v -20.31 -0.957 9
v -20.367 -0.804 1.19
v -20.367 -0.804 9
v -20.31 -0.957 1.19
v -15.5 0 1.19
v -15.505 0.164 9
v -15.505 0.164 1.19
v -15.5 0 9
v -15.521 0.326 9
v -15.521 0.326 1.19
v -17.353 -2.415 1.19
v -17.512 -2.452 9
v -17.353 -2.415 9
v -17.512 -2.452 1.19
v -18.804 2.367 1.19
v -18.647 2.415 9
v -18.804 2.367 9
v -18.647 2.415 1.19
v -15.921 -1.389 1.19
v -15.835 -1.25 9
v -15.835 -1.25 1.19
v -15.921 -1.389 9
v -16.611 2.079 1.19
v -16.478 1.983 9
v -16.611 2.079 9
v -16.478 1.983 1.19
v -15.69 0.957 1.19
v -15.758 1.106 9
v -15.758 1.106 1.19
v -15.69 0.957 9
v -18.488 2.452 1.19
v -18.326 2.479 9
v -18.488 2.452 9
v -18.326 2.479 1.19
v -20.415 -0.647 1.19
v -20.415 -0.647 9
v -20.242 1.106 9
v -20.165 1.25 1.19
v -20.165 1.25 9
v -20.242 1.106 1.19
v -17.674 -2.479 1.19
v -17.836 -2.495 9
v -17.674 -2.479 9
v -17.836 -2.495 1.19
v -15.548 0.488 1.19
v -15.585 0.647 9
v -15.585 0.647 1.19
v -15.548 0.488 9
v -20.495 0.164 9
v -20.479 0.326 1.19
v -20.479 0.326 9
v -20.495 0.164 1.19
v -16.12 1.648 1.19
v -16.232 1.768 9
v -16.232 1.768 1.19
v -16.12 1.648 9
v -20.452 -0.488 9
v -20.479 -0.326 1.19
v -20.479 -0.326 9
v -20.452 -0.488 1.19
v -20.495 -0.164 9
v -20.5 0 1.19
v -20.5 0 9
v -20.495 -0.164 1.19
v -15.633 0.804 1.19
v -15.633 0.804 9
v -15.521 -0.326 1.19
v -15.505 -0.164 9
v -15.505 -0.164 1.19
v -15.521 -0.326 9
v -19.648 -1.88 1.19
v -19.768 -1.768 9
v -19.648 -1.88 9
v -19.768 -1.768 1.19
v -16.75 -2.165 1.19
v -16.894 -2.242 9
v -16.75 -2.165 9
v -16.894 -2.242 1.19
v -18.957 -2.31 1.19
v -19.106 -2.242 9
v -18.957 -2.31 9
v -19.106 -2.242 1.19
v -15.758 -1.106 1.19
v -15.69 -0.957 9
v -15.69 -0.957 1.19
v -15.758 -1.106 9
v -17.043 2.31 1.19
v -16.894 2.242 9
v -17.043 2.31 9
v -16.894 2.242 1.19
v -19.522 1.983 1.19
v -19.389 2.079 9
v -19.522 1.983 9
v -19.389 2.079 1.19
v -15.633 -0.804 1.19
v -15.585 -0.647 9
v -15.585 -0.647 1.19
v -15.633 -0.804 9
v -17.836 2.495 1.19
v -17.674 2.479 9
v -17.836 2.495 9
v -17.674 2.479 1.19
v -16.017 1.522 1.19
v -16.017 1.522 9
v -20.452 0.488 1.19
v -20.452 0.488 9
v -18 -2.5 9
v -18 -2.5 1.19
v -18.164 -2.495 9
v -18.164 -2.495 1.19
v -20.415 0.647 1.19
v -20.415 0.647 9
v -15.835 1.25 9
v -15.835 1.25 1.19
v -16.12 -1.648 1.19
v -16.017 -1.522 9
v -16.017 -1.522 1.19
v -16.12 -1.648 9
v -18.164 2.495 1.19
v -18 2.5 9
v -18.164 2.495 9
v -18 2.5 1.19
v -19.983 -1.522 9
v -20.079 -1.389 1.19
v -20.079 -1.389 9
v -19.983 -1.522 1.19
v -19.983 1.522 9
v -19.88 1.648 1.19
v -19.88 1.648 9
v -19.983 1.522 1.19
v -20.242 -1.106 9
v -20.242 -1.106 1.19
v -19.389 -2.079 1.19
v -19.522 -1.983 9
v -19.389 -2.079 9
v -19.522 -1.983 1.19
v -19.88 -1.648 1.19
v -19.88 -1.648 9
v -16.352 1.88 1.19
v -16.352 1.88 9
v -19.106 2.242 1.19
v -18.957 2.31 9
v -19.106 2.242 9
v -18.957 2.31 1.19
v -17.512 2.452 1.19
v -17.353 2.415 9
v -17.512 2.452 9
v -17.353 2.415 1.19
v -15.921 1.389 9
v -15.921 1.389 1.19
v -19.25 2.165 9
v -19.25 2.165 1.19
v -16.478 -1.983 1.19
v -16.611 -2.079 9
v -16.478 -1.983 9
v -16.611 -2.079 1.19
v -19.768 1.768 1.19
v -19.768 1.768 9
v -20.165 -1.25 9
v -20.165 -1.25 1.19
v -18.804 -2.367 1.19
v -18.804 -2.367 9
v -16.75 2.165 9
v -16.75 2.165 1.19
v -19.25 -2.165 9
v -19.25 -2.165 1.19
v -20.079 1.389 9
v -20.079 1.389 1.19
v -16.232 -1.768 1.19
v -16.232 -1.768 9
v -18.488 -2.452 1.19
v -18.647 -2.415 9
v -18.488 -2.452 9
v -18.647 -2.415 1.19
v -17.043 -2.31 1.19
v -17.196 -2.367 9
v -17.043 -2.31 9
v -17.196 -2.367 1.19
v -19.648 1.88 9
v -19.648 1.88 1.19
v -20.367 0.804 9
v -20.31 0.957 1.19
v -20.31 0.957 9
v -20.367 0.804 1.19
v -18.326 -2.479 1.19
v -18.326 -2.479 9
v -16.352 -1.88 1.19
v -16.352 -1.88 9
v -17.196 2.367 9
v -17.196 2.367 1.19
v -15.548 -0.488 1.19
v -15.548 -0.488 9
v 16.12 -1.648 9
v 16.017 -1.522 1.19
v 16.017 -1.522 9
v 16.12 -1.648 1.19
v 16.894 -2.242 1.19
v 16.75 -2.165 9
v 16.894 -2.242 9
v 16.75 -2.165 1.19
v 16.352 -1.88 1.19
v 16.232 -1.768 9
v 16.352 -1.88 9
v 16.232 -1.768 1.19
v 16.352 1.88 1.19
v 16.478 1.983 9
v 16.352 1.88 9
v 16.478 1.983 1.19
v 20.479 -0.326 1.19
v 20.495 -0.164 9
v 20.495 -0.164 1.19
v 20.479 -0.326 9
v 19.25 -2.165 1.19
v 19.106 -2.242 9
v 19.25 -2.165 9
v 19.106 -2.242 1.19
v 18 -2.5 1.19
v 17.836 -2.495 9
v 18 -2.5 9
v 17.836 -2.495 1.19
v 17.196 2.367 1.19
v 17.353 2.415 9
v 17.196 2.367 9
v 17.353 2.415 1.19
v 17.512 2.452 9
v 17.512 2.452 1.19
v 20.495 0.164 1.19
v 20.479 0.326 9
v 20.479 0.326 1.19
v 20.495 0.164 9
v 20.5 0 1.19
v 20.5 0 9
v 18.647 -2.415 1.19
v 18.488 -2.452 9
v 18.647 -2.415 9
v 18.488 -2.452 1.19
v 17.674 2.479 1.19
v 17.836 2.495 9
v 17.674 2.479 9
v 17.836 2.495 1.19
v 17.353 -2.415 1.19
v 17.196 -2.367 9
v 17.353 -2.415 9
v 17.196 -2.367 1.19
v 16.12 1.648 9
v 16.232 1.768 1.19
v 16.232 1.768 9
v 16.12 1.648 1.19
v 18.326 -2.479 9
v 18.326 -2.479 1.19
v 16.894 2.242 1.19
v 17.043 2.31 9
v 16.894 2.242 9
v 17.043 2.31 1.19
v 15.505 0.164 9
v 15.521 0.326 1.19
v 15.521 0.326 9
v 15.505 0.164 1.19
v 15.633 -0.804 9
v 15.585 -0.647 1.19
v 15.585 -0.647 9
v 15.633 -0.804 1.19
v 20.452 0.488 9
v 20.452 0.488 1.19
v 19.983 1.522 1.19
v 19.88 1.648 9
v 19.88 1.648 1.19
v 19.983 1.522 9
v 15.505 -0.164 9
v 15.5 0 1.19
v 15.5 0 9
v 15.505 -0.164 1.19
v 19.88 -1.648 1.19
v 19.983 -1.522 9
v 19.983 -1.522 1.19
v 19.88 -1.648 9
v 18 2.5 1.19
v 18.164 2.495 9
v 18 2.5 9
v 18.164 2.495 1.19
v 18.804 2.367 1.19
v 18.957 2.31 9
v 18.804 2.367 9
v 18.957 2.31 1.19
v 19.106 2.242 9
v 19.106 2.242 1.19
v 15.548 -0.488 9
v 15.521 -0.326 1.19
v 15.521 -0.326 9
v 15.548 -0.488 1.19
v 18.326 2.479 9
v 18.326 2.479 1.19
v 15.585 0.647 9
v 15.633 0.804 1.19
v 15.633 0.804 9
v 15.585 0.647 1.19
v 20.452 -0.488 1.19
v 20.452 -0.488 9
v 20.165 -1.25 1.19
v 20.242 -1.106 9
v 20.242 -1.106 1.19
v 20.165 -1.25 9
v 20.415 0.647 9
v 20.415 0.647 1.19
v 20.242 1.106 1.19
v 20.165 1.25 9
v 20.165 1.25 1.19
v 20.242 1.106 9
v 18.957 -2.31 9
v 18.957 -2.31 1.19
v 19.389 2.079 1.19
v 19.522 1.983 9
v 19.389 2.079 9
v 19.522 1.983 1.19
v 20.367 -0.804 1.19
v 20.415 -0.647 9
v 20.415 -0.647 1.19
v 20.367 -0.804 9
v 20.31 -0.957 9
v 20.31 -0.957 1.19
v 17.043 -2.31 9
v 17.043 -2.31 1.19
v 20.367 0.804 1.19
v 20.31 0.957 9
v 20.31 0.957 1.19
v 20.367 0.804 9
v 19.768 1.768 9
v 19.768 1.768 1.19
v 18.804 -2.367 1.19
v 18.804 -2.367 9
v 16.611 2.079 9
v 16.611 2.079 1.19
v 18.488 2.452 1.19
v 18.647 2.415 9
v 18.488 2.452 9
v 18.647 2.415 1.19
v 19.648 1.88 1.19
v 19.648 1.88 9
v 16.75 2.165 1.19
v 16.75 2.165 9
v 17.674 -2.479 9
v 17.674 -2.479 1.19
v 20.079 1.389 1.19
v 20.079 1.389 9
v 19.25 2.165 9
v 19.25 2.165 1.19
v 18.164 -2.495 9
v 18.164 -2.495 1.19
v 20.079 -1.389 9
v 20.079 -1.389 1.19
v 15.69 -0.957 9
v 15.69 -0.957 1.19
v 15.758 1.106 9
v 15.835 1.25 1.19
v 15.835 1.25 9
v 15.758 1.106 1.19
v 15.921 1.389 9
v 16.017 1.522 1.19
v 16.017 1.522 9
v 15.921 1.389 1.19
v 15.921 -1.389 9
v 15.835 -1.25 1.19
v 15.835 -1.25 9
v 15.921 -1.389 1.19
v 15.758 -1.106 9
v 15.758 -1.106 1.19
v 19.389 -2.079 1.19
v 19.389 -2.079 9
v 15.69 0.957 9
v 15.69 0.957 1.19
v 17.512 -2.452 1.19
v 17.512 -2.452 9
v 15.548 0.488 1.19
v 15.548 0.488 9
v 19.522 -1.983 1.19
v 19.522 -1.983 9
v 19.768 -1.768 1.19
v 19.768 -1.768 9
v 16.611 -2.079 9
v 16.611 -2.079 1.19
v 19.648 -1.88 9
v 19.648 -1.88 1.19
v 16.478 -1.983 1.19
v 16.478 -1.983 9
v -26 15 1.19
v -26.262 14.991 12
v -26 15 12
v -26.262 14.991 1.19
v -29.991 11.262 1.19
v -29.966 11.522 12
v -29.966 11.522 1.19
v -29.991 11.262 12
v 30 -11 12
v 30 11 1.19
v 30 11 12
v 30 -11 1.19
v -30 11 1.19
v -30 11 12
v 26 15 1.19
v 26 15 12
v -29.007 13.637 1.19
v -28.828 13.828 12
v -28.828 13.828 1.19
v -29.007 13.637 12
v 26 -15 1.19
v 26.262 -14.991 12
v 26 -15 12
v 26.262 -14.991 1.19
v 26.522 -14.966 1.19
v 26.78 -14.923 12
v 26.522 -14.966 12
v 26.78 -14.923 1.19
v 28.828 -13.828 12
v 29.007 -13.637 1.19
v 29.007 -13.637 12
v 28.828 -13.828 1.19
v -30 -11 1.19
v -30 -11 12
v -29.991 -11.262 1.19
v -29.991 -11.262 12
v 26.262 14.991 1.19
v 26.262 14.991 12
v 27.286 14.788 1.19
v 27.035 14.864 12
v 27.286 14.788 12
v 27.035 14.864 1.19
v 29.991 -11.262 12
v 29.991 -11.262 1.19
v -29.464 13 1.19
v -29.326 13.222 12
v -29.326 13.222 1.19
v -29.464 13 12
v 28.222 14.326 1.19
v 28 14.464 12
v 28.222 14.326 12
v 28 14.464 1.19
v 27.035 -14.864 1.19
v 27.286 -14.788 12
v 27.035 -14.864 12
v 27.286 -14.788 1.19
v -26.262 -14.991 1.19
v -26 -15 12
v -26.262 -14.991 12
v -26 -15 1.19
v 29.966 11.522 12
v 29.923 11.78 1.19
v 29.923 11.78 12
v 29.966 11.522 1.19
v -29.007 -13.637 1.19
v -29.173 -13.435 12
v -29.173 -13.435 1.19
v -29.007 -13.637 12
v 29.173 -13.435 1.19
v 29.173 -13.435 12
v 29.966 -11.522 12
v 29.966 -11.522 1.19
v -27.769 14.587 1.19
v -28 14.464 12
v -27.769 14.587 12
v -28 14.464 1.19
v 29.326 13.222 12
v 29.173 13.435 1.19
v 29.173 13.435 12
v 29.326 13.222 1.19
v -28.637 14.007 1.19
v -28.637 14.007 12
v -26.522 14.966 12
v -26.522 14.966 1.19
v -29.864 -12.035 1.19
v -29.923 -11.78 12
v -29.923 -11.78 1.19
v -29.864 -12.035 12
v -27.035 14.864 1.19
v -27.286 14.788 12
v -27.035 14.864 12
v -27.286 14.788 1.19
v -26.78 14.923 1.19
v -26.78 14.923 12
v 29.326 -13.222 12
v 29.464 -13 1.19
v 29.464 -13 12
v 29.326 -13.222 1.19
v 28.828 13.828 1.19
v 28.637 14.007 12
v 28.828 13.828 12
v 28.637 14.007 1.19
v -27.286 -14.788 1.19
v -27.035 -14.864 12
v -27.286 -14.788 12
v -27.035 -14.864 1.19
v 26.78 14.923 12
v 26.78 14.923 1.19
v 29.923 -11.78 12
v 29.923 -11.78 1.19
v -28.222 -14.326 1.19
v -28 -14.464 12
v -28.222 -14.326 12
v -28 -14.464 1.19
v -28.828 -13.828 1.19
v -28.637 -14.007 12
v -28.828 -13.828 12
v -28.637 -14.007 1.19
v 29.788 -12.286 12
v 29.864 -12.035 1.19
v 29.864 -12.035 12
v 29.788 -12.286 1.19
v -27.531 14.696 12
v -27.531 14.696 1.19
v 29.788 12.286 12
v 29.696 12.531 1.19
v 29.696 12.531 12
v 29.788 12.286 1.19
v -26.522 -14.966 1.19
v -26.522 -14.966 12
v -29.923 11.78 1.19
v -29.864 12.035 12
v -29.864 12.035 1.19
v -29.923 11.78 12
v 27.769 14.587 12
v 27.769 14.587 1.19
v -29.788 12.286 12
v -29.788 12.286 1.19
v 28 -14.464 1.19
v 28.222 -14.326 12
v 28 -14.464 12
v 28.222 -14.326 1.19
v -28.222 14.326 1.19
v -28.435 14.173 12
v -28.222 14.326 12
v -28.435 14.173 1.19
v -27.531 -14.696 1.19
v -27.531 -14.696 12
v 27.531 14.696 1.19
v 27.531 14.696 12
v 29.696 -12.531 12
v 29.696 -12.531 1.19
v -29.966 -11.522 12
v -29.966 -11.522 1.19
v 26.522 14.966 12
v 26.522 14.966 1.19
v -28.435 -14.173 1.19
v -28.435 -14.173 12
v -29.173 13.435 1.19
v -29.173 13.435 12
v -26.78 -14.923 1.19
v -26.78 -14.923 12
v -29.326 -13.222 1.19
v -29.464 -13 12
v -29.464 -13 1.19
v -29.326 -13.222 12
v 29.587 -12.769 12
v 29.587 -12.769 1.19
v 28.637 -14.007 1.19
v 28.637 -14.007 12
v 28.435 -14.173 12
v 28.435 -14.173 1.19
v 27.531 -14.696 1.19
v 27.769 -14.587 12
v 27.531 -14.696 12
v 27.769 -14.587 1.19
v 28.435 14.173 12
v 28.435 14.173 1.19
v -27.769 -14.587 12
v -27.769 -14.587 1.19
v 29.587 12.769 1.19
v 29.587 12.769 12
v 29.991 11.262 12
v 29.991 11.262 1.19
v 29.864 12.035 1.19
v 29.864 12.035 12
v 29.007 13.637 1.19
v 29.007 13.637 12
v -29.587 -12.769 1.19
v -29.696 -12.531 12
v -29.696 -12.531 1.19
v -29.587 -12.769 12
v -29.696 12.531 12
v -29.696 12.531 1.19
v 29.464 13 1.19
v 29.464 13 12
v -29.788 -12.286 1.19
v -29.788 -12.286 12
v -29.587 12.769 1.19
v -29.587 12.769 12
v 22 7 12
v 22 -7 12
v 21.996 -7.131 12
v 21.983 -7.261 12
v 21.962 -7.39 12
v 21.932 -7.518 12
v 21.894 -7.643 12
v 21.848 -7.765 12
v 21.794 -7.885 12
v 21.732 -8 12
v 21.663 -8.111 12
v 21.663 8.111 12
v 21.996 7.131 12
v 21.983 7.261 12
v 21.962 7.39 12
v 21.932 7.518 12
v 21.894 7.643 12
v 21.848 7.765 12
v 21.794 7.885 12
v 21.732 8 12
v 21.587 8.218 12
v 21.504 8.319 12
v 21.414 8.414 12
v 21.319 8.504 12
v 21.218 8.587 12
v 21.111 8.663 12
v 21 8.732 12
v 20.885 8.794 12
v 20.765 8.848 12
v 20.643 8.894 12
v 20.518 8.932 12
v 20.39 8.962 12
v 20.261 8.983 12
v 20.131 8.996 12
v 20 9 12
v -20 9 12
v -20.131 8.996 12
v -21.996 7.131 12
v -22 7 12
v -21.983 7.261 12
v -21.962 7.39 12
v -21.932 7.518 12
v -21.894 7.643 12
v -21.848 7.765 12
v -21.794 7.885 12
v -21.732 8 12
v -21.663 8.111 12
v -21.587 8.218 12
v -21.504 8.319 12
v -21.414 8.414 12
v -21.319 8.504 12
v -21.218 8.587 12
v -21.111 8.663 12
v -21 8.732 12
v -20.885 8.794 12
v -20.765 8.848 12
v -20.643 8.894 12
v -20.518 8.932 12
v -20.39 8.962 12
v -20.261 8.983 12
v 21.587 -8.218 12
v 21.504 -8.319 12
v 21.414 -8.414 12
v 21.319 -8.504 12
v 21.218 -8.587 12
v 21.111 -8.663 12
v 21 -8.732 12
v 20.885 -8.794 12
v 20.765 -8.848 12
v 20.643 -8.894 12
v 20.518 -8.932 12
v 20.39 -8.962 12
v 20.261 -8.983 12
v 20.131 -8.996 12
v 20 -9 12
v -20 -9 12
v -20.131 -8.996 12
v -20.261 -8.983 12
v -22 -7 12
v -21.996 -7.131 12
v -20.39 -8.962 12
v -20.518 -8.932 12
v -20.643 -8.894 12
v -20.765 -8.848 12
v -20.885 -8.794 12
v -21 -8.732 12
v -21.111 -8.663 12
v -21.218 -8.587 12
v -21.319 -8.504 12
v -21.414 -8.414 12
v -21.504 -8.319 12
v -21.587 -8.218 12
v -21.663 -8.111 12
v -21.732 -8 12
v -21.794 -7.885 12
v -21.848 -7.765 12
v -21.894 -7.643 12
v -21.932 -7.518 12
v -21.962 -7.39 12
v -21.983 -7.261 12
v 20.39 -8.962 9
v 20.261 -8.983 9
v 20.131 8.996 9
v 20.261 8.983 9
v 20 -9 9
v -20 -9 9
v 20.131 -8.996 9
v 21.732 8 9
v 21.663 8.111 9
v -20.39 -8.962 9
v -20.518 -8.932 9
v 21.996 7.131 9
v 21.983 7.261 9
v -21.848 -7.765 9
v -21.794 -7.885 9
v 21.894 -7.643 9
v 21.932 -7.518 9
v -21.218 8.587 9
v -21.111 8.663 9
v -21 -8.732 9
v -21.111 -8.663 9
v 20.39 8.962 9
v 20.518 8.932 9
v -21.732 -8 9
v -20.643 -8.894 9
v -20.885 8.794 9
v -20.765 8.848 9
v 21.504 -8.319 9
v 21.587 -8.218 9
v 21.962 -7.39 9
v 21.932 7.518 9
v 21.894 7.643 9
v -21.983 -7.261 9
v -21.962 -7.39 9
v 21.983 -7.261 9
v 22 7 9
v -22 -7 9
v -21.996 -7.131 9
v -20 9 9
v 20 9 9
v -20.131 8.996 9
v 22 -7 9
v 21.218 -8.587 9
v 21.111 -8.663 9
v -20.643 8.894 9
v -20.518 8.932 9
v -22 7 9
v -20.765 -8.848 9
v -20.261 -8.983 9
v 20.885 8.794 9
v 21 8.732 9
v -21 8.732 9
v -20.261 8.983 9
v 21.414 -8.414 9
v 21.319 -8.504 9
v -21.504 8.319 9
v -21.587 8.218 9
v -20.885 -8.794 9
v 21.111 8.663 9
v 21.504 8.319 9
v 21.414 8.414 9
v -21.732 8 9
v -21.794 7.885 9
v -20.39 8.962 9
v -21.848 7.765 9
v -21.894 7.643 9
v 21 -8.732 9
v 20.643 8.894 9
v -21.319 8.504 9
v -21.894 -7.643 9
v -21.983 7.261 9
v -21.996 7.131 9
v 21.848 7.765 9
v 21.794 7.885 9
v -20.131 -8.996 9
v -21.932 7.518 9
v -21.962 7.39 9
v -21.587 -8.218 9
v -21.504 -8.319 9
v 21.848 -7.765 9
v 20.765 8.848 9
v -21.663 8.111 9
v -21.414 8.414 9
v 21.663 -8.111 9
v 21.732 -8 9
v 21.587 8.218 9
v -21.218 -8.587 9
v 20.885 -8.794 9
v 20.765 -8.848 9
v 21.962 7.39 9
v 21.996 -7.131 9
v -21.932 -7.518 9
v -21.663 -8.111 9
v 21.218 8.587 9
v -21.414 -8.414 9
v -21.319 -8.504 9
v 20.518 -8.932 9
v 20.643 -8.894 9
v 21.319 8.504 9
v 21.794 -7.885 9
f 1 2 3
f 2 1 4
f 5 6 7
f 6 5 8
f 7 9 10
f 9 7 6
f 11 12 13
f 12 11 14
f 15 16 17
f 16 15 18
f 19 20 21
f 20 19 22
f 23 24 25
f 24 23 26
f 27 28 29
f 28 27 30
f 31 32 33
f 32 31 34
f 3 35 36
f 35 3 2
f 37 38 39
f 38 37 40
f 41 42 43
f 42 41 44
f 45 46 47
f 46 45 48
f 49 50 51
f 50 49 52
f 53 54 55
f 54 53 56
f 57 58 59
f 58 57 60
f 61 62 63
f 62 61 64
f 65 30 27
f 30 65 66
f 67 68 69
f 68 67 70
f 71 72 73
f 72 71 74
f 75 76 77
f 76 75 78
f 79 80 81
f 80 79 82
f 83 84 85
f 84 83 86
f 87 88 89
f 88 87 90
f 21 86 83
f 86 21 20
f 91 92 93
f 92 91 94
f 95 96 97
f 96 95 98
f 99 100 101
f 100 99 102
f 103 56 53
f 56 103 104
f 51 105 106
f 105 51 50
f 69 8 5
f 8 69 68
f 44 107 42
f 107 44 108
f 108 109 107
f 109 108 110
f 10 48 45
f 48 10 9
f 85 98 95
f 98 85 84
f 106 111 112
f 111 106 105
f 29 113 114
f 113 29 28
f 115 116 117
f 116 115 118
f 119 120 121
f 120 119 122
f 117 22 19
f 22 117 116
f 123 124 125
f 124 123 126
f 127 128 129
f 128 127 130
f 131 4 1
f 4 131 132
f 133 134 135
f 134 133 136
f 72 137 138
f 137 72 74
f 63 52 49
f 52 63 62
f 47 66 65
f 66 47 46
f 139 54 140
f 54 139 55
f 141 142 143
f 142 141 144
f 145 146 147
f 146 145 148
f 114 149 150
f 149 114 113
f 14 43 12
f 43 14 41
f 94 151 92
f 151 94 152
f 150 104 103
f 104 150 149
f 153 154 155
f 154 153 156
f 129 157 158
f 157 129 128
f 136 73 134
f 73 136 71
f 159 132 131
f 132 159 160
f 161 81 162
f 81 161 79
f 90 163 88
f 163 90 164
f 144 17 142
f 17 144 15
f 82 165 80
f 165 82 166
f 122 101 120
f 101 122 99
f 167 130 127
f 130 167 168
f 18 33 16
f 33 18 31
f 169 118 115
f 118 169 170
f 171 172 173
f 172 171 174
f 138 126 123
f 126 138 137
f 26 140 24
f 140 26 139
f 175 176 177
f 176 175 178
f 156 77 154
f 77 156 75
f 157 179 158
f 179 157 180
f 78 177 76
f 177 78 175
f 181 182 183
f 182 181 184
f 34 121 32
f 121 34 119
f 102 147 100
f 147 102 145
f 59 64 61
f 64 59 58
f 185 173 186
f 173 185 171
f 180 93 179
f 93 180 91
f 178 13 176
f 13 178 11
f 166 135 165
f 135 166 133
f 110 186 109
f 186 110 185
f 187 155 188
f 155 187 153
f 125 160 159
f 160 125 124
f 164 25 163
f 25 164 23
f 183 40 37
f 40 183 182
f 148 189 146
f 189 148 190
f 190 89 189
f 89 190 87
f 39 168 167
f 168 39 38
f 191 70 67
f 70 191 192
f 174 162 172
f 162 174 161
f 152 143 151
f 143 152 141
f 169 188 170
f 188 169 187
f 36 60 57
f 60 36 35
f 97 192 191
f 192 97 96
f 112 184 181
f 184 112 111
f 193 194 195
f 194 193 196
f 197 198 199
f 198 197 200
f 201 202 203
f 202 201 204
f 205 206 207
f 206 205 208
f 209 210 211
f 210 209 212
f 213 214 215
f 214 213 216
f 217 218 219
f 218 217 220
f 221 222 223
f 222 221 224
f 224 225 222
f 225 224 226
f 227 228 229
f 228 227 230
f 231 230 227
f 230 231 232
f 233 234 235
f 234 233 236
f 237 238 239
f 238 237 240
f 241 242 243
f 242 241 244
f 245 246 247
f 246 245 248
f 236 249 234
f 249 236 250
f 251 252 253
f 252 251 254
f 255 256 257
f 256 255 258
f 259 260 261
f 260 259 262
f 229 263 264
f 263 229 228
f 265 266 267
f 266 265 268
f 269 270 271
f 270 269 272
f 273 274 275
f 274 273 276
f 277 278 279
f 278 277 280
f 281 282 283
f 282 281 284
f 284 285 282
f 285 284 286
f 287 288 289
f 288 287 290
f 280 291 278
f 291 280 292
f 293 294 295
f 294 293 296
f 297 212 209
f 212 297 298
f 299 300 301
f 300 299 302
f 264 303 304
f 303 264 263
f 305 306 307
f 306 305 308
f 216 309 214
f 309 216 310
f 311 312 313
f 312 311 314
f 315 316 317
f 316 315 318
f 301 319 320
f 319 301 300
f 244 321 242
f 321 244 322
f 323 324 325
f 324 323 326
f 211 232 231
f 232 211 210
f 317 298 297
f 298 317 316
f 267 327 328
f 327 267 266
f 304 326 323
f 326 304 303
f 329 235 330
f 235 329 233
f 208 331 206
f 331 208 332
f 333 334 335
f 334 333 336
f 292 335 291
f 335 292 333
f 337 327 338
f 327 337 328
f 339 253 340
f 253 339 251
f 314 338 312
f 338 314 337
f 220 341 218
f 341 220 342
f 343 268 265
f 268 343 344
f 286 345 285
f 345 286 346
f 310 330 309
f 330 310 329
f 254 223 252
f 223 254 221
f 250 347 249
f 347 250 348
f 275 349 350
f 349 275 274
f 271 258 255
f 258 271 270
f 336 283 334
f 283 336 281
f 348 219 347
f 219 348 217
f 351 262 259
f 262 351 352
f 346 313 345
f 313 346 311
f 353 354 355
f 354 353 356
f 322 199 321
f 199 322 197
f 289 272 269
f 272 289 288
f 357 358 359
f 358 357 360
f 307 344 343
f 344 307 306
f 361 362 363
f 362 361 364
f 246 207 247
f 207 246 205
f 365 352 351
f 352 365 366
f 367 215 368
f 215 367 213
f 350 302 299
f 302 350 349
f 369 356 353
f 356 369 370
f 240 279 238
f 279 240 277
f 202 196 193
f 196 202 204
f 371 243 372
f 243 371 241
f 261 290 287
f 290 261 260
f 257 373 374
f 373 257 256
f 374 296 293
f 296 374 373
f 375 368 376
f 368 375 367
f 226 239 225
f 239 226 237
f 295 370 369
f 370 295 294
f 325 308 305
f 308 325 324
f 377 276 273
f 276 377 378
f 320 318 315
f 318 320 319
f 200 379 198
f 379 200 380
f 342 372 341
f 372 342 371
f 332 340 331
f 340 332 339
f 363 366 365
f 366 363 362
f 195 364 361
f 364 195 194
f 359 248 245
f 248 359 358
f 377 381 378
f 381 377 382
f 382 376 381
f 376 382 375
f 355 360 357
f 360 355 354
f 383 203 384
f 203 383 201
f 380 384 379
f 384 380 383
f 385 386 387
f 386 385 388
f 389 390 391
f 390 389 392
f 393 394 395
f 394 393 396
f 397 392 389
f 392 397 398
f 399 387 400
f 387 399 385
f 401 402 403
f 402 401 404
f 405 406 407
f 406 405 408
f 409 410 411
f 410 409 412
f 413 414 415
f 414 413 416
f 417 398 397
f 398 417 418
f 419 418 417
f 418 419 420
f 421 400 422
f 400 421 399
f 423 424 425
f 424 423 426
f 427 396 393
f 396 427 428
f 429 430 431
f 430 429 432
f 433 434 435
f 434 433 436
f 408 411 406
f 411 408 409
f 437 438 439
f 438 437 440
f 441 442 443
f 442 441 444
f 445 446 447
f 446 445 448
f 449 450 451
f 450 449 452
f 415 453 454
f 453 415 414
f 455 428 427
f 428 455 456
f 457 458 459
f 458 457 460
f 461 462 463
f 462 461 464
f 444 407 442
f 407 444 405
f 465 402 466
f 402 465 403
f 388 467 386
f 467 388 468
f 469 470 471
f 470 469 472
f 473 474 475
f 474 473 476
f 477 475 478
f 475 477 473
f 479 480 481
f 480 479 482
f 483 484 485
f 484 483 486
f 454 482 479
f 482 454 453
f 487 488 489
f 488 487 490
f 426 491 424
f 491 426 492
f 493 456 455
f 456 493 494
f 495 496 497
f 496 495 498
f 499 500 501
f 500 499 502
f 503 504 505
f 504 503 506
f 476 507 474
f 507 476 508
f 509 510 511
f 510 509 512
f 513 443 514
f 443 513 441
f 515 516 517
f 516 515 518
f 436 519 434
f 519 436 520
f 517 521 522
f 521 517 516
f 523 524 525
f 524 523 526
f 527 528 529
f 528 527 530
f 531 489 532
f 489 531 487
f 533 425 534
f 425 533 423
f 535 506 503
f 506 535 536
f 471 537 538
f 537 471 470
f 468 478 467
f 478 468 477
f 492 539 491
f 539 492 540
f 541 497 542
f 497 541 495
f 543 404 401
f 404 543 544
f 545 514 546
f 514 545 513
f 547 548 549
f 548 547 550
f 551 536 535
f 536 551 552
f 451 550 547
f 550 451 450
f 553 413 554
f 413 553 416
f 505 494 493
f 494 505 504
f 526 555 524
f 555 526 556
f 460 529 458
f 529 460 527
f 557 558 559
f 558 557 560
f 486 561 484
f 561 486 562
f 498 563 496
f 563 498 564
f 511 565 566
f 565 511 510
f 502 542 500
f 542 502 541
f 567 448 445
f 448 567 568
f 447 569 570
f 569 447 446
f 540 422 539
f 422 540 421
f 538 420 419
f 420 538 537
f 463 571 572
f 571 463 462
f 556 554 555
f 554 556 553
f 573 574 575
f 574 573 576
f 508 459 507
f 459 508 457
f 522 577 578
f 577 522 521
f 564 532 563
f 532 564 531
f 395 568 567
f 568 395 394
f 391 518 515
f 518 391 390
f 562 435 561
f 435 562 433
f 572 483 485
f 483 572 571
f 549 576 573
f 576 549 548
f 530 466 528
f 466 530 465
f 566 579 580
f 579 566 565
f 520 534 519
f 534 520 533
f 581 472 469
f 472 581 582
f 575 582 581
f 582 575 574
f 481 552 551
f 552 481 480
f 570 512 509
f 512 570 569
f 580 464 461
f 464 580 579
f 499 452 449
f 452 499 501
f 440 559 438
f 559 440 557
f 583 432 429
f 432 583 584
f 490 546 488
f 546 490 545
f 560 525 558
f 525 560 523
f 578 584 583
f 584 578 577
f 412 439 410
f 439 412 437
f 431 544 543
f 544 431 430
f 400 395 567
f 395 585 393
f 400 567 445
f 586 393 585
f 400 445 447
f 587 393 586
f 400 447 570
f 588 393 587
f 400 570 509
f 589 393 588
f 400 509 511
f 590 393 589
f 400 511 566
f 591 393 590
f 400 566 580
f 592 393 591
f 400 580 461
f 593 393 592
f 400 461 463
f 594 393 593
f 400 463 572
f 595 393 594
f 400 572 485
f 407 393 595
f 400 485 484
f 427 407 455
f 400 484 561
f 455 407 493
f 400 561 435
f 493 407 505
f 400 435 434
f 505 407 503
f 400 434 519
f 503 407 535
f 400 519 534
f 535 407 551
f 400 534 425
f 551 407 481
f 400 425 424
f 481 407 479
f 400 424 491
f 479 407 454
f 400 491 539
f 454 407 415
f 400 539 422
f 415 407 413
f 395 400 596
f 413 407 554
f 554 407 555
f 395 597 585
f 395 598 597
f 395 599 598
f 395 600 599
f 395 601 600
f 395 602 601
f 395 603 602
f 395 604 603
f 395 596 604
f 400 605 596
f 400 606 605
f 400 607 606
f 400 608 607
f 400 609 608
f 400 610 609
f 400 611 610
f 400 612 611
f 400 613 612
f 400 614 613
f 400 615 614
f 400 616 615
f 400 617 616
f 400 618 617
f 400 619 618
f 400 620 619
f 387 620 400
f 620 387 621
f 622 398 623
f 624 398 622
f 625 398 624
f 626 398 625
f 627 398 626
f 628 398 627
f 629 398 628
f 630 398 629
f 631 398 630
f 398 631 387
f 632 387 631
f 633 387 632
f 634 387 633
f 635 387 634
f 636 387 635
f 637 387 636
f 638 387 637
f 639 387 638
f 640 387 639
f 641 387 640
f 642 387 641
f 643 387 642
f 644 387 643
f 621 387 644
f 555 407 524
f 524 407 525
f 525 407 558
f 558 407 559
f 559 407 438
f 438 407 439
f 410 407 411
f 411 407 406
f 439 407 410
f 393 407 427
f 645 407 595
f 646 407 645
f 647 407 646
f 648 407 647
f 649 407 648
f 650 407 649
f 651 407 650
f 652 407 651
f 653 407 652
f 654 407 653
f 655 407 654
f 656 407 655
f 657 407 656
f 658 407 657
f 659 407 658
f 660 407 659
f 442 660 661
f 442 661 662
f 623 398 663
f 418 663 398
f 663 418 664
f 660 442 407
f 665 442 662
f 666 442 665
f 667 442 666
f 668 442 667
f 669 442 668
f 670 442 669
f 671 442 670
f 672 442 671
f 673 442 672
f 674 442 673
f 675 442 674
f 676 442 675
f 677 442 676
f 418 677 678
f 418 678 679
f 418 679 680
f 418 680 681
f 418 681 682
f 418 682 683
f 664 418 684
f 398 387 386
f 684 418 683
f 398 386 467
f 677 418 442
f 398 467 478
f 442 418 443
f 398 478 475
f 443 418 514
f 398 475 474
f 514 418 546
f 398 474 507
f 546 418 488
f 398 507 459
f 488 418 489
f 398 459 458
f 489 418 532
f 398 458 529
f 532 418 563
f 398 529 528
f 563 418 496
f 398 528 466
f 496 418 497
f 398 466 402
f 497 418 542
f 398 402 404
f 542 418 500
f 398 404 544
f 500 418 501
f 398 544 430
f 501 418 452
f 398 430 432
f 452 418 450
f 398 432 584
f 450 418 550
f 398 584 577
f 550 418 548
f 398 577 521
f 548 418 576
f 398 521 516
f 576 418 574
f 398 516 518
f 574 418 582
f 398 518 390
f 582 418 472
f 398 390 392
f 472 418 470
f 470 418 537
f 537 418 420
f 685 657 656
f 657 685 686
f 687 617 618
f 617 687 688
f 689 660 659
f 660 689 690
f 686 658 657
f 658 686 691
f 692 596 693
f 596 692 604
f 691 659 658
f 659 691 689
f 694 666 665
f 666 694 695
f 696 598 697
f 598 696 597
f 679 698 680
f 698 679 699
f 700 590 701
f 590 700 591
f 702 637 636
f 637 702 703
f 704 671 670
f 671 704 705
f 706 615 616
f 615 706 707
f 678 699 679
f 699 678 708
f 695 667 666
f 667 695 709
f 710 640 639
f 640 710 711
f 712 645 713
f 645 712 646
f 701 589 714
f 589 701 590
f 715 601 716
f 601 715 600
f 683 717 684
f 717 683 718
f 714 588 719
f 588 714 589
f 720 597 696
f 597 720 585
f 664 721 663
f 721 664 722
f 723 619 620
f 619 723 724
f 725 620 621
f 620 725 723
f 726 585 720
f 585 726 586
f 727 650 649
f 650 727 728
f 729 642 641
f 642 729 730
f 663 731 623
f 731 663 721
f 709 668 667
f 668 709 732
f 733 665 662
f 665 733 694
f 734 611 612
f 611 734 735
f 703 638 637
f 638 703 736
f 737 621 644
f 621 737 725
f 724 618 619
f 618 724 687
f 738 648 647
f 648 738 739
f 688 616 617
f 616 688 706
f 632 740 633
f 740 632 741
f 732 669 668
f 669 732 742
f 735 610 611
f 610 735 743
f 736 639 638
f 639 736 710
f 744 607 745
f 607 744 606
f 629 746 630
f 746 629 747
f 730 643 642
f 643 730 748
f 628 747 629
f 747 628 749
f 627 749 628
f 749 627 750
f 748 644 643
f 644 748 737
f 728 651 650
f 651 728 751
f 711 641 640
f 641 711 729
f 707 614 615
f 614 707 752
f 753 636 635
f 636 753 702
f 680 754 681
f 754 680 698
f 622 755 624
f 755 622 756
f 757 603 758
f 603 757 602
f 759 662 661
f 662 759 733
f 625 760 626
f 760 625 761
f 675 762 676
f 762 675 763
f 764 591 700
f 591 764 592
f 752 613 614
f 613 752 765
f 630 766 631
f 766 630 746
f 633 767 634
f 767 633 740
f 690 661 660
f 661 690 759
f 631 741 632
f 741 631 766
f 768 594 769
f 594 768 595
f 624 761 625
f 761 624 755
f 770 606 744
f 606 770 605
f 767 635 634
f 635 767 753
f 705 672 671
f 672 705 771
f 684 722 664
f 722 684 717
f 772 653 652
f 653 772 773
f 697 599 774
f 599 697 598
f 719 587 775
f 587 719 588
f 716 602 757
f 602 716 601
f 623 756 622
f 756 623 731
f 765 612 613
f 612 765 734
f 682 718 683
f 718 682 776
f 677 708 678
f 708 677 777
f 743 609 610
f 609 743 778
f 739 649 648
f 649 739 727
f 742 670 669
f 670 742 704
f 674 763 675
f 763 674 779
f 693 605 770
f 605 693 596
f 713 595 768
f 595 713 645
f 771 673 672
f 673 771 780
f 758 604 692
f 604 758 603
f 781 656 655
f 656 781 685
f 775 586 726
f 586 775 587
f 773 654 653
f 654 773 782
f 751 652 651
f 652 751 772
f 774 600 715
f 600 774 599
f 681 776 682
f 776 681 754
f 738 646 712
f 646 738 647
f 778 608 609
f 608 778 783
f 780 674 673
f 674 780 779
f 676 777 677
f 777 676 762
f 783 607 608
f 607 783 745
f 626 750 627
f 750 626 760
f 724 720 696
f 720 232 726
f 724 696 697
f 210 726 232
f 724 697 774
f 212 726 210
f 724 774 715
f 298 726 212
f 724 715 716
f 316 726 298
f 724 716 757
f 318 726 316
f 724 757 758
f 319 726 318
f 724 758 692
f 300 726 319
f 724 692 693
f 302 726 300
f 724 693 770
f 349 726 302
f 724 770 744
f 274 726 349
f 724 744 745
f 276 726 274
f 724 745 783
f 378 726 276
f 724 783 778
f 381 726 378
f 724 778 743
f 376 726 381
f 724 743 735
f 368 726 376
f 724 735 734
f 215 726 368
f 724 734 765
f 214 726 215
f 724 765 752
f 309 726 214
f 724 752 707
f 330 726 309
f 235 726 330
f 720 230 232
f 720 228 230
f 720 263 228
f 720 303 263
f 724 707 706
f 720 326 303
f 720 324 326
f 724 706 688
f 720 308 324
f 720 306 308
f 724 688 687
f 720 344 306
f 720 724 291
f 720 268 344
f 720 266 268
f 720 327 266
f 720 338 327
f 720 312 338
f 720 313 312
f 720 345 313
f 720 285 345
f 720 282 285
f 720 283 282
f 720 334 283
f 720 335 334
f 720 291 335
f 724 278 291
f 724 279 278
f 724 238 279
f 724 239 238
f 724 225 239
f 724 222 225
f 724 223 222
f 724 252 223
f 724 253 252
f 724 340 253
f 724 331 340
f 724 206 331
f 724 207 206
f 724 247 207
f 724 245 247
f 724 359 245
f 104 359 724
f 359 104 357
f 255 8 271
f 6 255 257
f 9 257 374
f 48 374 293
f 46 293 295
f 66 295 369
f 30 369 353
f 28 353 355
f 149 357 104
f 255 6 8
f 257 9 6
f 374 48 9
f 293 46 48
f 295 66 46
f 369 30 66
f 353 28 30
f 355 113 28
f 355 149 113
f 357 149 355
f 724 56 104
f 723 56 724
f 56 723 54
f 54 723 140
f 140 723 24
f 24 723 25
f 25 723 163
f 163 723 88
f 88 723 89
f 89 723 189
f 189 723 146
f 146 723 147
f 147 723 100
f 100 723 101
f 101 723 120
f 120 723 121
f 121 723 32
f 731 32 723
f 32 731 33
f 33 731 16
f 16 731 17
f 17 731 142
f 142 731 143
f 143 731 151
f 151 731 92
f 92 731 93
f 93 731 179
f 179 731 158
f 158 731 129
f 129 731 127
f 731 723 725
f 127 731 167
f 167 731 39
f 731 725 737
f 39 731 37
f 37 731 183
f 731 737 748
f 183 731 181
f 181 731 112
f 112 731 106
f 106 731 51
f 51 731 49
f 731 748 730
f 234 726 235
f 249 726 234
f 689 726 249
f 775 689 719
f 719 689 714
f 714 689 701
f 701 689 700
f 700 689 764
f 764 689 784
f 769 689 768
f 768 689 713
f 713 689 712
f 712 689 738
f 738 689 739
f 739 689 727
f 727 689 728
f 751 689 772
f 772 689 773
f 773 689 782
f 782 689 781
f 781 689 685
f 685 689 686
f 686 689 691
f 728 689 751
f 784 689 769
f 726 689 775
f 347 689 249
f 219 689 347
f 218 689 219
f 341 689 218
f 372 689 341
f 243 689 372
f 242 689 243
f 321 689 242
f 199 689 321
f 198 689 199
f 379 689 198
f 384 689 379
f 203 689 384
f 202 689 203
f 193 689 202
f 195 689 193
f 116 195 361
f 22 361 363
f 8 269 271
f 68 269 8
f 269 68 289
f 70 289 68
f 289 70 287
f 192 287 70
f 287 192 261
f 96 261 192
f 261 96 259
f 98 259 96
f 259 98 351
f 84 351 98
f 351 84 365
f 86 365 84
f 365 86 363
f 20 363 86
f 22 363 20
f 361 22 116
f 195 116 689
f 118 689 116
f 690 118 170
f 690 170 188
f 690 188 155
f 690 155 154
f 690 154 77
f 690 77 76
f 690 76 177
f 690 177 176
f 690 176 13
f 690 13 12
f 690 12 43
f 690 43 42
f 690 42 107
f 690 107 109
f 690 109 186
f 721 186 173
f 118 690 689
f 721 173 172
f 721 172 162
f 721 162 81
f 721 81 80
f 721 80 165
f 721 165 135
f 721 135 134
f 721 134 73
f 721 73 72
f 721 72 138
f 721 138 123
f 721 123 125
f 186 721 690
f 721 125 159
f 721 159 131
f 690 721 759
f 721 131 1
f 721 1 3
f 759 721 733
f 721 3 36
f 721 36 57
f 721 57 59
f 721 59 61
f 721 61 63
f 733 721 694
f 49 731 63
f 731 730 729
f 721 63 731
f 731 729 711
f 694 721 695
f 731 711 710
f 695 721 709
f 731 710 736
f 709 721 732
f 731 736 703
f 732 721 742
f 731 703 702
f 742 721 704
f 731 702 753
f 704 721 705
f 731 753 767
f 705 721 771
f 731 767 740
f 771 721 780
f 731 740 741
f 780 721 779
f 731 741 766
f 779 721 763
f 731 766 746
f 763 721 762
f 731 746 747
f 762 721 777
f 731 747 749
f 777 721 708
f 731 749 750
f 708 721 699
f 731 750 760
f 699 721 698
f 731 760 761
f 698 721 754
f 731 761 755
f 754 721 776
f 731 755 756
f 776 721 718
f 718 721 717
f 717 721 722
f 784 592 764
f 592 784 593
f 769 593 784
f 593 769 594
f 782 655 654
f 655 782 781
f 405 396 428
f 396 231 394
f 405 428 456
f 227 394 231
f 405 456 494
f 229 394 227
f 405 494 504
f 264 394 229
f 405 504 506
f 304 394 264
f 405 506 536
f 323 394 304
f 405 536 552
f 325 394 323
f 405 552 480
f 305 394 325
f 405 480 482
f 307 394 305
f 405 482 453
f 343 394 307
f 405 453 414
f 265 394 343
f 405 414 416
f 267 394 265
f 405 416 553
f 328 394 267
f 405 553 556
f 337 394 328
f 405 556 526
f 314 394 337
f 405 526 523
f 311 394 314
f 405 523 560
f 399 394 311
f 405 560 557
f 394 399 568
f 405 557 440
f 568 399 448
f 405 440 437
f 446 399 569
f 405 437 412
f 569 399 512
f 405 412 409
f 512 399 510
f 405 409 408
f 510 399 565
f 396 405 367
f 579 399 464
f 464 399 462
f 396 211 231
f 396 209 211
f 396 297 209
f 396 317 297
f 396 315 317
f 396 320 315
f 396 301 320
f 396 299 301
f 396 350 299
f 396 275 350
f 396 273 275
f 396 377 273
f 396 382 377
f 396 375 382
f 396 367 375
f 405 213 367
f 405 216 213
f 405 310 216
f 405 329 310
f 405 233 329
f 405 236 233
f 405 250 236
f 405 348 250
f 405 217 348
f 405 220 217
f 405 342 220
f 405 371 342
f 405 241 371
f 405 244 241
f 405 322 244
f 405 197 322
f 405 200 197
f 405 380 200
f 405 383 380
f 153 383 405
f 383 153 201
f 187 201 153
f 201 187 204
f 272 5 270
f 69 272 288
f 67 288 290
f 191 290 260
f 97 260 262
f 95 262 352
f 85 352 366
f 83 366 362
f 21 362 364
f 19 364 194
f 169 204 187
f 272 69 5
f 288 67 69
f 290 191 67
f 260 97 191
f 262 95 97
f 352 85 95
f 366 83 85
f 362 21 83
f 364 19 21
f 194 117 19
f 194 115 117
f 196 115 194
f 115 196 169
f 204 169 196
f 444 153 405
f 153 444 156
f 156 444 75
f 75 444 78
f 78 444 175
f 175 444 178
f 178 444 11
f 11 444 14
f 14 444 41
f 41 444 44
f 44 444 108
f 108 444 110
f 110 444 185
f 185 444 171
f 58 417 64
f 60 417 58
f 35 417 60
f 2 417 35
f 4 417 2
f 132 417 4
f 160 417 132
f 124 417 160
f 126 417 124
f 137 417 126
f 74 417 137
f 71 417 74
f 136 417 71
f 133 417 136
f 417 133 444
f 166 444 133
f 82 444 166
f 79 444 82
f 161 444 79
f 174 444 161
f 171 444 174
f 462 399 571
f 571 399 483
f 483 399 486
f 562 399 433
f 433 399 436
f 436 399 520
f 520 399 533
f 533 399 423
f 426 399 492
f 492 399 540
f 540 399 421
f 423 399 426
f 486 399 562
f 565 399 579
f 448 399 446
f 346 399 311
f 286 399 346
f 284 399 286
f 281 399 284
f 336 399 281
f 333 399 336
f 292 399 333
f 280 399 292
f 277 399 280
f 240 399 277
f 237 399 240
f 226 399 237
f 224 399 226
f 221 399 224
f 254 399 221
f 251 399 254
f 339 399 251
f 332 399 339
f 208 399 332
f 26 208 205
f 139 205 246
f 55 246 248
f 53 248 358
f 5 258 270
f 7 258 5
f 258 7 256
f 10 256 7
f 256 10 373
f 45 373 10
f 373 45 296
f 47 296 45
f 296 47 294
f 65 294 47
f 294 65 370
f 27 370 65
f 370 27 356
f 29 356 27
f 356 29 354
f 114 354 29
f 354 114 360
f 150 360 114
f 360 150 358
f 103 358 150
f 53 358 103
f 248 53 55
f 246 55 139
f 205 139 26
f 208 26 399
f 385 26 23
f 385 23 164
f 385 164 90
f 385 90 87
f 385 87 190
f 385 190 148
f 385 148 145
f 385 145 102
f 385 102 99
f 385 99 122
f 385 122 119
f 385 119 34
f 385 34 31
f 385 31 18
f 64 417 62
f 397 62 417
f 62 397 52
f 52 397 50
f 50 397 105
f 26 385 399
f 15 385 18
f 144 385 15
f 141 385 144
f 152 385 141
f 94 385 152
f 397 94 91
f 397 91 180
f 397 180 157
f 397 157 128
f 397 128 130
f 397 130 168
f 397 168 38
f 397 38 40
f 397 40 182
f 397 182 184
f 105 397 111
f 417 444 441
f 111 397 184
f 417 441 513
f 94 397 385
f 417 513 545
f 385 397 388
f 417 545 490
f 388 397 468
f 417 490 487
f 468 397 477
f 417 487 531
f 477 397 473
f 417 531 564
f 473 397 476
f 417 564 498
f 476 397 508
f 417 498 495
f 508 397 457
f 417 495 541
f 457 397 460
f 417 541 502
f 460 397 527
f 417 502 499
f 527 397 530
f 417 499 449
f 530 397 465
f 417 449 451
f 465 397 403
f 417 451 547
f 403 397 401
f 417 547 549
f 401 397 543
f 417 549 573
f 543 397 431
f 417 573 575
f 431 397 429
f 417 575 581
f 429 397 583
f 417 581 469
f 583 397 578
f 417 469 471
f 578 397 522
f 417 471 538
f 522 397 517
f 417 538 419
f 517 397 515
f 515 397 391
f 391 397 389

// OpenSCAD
$fn=96;

// Generic "component": a small mounting block with rounded corners,
// two through-holes, and a shallow top pocket.

module rounded_block(size=[60,30,12], r=4){
    x=size[0]; y=size[1]; z=size[2];
    hull(){
        for (sx=[-1,1], sy=[-1,1])
            translate([sx*(x/2-r), sy*(y/2-r), 0])
                cylinder(h=z, r=r);
    }
}

module component(){
    base=[60,30,12];
    r=4;

    hole_d=5;
    hole_spacing=36; // center-to-center along X
    hole_y=0;

    pocket=[44,18,3]; // x,y,depth
    pocket_r=2;

    difference(){
        // Body
        translate([0,0,0])
            rounded_block(base, r);

        // Through holes
        for (sx=[-1,1])
            translate([sx*hole_spacing/2, hole_y, -0.5])
                cylinder(h=base[2]+1, d=hole_d);

        // Top pocket
        translate([0,0,base[2]-pocket[2]])
            linear_extrude(height=pocket[2]+0.2)
                offset(r=pocket_r)
                    square([pocket[0]-2*pocket_r, pocket[1]-2*pocket_r], center=true);

        // Small chamfer on bottom edges (simple bevel via subtracting a larger offset)
        translate([0,0,-0.01])
            linear_extrude(height=1.2)
                offset(delta=1.0)
                    offset(delta=-1.0)
                        square([base[0], base[1]], center=true);
    }
}

component();
